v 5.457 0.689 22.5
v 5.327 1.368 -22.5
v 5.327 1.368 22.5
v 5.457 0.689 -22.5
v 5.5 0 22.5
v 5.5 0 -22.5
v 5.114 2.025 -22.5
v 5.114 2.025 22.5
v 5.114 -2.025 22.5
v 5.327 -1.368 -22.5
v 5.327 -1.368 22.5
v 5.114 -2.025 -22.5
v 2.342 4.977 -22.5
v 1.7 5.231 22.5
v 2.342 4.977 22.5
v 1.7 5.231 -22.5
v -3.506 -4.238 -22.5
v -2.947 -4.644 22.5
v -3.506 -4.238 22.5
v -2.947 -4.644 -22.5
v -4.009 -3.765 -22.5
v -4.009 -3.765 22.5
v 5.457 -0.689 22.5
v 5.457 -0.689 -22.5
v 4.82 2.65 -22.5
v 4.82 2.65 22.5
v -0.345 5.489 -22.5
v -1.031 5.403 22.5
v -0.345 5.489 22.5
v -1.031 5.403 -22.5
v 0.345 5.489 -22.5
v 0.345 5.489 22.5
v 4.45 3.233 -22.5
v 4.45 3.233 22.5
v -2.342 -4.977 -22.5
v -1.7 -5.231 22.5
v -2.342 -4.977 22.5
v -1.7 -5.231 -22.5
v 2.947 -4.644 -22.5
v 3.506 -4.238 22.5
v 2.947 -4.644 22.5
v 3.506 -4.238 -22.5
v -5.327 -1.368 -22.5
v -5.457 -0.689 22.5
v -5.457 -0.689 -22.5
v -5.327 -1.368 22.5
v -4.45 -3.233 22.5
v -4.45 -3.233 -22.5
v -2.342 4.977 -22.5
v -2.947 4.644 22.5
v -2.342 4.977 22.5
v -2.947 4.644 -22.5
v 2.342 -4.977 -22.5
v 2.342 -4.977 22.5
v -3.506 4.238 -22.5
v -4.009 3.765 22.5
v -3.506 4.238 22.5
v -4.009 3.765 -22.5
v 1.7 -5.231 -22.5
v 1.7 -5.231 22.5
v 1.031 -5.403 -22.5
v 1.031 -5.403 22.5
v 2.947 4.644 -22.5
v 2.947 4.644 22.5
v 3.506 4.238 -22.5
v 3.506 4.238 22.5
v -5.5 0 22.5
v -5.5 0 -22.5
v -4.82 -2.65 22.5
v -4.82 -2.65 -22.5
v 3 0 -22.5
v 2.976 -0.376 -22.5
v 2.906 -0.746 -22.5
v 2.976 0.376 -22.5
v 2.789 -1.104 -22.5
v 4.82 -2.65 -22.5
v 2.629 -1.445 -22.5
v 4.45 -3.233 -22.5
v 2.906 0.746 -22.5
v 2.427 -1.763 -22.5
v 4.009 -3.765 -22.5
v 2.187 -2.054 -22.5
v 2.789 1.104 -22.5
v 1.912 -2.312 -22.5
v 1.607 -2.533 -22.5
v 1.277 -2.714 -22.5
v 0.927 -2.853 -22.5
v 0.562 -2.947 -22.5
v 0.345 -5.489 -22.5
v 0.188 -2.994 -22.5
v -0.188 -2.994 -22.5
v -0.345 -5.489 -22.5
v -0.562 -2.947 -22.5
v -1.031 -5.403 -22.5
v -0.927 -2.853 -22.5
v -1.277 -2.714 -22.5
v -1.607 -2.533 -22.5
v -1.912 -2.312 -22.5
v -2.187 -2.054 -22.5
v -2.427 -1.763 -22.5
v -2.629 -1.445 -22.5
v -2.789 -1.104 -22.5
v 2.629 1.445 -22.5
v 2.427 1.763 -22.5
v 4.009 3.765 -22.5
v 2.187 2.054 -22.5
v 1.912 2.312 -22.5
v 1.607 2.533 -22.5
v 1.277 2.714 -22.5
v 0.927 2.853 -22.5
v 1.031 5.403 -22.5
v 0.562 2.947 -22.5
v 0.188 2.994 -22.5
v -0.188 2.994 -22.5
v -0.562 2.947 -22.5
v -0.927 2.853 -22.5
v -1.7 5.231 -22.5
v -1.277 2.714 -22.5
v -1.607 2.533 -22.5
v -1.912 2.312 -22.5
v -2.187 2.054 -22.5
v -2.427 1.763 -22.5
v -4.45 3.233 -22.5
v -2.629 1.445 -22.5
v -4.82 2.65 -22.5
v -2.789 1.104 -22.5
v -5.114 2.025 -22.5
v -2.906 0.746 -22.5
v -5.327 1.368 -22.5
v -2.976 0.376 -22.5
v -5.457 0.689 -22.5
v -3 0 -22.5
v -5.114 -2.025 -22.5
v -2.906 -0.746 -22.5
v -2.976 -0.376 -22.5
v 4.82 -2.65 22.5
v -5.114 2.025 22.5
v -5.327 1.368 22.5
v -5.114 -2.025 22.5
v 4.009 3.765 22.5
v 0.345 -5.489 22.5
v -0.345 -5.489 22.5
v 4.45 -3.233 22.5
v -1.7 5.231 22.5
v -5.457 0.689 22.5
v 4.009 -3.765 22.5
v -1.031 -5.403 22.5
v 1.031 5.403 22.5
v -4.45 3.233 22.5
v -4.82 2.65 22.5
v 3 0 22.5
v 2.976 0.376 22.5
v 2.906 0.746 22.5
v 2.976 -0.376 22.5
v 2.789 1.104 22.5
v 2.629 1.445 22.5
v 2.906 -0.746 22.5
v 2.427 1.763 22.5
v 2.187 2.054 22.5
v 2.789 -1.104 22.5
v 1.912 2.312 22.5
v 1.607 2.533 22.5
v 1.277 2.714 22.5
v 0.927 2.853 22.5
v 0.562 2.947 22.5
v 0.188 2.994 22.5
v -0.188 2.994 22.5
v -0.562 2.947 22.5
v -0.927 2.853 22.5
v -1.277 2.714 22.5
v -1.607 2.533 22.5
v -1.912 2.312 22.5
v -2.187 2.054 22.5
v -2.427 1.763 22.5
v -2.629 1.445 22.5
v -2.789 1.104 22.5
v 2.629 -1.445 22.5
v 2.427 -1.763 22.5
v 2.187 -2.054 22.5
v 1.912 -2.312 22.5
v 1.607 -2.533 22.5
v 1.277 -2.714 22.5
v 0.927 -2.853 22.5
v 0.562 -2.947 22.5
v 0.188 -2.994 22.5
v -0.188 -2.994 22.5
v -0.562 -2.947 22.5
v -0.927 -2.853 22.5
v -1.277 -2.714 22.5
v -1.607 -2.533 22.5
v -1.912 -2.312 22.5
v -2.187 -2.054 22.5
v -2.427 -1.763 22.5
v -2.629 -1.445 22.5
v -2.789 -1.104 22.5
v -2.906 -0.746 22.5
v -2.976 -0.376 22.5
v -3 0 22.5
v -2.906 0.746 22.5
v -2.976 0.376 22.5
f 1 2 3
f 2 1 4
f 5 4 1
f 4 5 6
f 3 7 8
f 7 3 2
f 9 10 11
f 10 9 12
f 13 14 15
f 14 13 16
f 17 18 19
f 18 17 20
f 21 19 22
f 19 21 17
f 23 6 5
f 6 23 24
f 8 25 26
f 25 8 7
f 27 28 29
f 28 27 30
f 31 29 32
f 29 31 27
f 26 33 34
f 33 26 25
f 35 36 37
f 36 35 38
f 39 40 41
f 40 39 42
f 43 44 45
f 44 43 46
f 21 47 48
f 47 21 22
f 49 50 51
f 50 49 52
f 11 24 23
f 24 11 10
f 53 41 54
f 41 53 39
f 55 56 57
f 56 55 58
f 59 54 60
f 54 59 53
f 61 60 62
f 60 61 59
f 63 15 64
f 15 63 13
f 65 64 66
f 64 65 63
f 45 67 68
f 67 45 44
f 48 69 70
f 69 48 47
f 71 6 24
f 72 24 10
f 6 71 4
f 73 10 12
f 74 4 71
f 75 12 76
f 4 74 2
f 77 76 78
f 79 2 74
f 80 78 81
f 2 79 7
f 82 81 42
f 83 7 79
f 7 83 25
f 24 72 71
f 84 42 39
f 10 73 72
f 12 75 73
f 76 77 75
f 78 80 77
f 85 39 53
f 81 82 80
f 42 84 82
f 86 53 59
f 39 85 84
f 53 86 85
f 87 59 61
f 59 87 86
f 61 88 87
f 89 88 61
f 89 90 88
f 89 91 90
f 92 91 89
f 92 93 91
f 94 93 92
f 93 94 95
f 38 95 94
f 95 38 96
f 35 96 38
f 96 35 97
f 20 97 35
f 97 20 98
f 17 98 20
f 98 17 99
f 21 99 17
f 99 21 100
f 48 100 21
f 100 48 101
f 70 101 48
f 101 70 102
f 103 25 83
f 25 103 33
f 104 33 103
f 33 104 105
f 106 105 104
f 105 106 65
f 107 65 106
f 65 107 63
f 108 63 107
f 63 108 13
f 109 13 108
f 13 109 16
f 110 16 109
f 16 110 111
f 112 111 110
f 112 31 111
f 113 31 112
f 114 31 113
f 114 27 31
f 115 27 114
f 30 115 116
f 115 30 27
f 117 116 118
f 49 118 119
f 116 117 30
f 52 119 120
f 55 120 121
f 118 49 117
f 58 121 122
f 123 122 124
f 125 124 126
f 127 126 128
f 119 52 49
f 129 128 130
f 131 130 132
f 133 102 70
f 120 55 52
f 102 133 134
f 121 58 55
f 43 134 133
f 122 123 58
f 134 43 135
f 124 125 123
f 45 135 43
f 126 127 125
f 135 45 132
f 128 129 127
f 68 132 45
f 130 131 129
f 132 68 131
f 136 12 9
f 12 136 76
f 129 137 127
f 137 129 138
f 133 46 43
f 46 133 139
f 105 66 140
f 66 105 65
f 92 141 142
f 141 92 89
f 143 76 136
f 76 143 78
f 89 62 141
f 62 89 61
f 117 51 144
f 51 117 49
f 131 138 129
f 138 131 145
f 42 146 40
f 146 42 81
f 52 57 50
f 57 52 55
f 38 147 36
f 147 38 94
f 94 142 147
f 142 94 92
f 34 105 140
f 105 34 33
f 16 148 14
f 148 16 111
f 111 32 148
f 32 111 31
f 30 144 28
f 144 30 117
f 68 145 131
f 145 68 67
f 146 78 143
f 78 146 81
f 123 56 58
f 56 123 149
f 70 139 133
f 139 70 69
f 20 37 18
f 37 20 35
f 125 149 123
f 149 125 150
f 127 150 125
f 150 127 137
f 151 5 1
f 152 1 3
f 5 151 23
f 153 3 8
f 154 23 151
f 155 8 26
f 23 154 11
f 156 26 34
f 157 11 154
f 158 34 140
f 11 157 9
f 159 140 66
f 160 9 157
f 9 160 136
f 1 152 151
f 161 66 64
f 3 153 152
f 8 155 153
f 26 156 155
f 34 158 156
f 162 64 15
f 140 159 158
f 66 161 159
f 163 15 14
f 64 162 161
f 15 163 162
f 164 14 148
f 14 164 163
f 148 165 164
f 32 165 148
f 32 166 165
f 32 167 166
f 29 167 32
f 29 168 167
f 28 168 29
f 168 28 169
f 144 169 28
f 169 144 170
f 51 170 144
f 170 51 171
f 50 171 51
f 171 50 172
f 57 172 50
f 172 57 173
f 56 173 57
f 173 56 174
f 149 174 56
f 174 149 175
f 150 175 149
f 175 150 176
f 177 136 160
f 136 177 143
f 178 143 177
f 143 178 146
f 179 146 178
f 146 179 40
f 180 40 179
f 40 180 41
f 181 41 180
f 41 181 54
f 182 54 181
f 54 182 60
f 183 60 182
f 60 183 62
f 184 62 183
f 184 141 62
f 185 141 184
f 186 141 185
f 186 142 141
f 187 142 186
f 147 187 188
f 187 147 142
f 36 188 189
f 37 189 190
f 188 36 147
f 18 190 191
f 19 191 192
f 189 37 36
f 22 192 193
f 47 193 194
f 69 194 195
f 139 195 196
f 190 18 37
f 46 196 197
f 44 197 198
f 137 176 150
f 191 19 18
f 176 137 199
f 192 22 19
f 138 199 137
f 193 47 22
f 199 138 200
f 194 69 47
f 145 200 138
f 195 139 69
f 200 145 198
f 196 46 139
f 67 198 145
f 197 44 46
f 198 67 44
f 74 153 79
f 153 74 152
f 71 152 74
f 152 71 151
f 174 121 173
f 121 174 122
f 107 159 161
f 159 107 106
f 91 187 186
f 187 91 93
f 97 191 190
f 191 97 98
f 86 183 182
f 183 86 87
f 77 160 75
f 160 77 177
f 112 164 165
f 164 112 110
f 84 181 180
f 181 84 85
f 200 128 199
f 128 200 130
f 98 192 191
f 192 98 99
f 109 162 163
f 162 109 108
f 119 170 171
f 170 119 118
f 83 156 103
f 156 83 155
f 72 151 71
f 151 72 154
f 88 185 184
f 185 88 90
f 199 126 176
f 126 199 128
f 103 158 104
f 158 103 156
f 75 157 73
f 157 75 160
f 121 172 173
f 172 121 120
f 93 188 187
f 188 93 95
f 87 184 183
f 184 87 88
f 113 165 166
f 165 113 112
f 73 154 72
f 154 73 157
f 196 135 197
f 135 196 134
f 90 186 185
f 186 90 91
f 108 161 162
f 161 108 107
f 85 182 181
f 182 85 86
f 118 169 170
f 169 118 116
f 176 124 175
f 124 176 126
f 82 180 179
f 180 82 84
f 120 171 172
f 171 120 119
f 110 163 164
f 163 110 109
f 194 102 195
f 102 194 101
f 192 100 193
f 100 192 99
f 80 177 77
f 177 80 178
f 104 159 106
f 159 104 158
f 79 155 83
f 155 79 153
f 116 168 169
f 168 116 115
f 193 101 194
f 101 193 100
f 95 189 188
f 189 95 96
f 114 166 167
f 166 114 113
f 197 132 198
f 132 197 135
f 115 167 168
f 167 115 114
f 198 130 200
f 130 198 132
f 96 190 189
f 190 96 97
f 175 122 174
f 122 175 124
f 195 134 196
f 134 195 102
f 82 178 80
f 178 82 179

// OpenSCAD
$fn = 50;


difference() {
	union() {
		translate(v = [0, 0, -22.5000000000]) {
			cylinder(h = 45, r = 5.5000000000);
		}
	}
	union() {
		translate(v = [0, 0, -100.0000000000]) {
			cylinder(h = 200, r = 3.0000000000);
		}
	}
}
